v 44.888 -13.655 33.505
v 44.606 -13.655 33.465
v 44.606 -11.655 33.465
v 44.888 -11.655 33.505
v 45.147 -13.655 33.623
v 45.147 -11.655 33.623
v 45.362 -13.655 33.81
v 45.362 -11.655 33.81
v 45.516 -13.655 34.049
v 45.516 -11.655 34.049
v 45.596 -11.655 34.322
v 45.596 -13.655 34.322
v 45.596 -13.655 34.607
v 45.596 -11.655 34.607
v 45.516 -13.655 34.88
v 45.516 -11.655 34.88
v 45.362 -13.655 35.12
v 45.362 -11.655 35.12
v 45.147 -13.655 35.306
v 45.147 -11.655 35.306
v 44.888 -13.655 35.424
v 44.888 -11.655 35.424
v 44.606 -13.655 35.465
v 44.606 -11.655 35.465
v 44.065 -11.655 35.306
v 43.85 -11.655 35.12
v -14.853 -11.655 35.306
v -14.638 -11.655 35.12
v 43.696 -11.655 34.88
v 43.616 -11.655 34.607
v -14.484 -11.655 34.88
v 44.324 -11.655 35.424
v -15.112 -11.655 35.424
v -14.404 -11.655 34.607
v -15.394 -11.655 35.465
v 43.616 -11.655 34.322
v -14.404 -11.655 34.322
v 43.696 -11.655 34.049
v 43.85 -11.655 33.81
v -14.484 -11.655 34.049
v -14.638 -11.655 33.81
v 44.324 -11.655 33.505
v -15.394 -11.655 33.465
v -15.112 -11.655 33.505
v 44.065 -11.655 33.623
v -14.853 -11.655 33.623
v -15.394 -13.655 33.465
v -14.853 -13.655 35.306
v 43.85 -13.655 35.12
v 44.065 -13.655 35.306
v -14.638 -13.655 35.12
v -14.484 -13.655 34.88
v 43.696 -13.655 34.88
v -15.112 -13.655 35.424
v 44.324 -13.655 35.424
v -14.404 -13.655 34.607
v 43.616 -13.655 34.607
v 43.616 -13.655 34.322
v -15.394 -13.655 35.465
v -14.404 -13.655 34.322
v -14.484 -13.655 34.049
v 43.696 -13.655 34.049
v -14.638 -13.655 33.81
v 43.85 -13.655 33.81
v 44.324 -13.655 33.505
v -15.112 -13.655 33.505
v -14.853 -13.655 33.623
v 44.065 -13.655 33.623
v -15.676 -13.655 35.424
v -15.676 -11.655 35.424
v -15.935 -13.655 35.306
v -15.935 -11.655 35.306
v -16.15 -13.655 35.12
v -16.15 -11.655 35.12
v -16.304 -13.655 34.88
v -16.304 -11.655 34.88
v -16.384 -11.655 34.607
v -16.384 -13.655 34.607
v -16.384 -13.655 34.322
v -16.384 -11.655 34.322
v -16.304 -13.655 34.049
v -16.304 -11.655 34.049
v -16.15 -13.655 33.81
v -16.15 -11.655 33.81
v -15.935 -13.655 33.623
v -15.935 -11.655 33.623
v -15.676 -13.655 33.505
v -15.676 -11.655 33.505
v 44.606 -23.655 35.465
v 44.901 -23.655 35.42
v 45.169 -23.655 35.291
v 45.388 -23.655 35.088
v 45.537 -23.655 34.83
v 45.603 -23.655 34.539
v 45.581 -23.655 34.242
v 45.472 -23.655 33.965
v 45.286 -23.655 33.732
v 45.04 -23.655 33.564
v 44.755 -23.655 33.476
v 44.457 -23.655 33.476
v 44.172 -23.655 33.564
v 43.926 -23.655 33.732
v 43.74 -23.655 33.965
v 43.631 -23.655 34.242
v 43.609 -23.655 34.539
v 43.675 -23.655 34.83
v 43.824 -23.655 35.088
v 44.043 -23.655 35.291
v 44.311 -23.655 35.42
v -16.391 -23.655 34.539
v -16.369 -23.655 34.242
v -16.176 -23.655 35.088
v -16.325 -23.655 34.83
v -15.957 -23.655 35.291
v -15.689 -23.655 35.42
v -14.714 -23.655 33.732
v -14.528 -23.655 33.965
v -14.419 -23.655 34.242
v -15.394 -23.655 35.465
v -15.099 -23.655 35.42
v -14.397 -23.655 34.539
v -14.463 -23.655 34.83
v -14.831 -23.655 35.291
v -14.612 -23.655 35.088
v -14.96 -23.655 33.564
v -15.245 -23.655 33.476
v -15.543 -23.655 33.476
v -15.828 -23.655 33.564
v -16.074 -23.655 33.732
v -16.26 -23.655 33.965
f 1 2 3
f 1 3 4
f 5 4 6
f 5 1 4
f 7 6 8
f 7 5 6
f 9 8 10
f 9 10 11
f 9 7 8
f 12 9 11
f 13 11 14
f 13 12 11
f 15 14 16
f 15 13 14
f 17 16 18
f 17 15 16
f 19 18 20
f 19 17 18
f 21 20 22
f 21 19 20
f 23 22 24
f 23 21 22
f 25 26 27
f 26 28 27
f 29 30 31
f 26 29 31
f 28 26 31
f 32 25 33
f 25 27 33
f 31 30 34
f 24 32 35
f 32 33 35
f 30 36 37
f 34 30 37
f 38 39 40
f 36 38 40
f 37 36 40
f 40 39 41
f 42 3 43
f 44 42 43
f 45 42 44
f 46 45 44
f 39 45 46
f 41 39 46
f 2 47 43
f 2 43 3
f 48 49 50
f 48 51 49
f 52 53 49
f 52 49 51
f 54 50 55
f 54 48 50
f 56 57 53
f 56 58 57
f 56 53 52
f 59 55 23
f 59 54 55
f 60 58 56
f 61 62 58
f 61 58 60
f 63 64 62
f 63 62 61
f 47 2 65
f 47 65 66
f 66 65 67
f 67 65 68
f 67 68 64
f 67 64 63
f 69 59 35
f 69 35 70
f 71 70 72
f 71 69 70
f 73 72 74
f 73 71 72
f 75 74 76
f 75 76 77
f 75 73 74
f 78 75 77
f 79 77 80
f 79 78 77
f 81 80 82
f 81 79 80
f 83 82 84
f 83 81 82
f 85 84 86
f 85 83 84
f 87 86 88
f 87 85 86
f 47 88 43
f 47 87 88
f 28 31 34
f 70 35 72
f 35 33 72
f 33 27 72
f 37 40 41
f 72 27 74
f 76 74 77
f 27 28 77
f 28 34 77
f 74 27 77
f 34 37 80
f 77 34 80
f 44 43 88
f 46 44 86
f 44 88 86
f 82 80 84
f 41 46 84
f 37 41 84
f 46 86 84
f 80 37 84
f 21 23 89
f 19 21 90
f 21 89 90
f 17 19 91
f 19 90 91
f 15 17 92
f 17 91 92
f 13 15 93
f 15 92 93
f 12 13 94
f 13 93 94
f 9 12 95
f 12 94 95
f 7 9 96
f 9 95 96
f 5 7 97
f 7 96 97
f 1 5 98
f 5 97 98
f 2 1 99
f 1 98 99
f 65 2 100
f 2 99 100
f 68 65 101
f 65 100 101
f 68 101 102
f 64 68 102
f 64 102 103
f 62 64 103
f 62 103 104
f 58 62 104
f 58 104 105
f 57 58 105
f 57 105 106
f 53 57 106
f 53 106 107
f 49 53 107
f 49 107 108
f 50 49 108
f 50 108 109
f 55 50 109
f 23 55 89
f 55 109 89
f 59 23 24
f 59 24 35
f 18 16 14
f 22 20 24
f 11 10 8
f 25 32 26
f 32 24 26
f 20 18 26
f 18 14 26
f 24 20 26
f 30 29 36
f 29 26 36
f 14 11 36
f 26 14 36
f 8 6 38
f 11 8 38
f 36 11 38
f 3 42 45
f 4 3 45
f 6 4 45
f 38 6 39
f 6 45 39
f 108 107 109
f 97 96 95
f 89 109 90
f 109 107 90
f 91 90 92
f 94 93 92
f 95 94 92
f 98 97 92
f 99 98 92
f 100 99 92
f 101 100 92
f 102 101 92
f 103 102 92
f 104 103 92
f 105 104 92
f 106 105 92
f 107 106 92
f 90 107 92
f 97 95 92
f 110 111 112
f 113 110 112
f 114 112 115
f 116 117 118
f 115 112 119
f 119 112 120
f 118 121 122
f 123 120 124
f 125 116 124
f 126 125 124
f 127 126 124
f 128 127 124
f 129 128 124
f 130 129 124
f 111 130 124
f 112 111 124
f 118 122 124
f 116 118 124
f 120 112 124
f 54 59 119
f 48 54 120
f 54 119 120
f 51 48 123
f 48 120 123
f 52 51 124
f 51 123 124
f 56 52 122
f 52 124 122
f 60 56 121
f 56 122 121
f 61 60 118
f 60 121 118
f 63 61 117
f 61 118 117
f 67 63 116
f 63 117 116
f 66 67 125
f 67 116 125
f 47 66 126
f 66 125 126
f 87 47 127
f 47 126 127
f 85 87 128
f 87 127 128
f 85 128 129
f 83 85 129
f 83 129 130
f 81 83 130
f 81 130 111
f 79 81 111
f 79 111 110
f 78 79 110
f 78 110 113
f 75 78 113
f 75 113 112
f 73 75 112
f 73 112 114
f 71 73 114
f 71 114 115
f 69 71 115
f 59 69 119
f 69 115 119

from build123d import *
from build123d.topology import SkipClean

# Parameters (mm, degrees)
SALIENTE_EXTRUIR1_DEPTH = 2
SALIENTE_EXTRUIR2_START = -12
CROQUIS2_R              = 1
SALIENTE_EXTRUIR2_DEPTH = 12


with BuildPart() as part:
    # Croquis1 → Saliente-Extruir1 (new body)
    with BuildSketch(Plane(origin=(0, -13.655018192, 0), x_dir=(1, 0, 0), z_dir=(0, 1, 0))):
        with BuildLine():
            Line((-15.39391873, -33.464706181), (44.60608127, -33.464706181))
            ThreePointArc((44.60608127, -33.464706181), (45.60608127, -34.464706181), (44.60608127, -35.464706181))
            Line((44.60608127, -35.464706181), (-15.39391873, -35.464706181))
            ThreePointArc((-15.39391873, -35.464706181), (-16.39391873, -34.464706181), (-15.39391873, -33.464706181))
        make_face()
    extrude(amount=SALIENTE_EXTRUIR1_DEPTH)

    # Croquis2 → Saliente-Extruir2 (add)
    with SkipClean():  # the faces are left unmerged after this step: merging them gives an invalid solid
        with BuildSketch(Plane(origin=(0, -11.655018192, 0), x_dir=(1, 0, 0), z_dir=(0, 1, 0)).offset(SALIENTE_EXTRUIR2_START)):
            with Locations(Location((-15.39391873, -34.464706181, 0), (0, 0, 270))):
                Circle(CROQUIS2_R)
            with Locations(Location((44.60608127, -34.464706181, 0), (0, 0, 270))):
                Circle(CROQUIS2_R)
        extrude(amount=SALIENTE_EXTRUIR2_DEPTH)


solid = part.part
